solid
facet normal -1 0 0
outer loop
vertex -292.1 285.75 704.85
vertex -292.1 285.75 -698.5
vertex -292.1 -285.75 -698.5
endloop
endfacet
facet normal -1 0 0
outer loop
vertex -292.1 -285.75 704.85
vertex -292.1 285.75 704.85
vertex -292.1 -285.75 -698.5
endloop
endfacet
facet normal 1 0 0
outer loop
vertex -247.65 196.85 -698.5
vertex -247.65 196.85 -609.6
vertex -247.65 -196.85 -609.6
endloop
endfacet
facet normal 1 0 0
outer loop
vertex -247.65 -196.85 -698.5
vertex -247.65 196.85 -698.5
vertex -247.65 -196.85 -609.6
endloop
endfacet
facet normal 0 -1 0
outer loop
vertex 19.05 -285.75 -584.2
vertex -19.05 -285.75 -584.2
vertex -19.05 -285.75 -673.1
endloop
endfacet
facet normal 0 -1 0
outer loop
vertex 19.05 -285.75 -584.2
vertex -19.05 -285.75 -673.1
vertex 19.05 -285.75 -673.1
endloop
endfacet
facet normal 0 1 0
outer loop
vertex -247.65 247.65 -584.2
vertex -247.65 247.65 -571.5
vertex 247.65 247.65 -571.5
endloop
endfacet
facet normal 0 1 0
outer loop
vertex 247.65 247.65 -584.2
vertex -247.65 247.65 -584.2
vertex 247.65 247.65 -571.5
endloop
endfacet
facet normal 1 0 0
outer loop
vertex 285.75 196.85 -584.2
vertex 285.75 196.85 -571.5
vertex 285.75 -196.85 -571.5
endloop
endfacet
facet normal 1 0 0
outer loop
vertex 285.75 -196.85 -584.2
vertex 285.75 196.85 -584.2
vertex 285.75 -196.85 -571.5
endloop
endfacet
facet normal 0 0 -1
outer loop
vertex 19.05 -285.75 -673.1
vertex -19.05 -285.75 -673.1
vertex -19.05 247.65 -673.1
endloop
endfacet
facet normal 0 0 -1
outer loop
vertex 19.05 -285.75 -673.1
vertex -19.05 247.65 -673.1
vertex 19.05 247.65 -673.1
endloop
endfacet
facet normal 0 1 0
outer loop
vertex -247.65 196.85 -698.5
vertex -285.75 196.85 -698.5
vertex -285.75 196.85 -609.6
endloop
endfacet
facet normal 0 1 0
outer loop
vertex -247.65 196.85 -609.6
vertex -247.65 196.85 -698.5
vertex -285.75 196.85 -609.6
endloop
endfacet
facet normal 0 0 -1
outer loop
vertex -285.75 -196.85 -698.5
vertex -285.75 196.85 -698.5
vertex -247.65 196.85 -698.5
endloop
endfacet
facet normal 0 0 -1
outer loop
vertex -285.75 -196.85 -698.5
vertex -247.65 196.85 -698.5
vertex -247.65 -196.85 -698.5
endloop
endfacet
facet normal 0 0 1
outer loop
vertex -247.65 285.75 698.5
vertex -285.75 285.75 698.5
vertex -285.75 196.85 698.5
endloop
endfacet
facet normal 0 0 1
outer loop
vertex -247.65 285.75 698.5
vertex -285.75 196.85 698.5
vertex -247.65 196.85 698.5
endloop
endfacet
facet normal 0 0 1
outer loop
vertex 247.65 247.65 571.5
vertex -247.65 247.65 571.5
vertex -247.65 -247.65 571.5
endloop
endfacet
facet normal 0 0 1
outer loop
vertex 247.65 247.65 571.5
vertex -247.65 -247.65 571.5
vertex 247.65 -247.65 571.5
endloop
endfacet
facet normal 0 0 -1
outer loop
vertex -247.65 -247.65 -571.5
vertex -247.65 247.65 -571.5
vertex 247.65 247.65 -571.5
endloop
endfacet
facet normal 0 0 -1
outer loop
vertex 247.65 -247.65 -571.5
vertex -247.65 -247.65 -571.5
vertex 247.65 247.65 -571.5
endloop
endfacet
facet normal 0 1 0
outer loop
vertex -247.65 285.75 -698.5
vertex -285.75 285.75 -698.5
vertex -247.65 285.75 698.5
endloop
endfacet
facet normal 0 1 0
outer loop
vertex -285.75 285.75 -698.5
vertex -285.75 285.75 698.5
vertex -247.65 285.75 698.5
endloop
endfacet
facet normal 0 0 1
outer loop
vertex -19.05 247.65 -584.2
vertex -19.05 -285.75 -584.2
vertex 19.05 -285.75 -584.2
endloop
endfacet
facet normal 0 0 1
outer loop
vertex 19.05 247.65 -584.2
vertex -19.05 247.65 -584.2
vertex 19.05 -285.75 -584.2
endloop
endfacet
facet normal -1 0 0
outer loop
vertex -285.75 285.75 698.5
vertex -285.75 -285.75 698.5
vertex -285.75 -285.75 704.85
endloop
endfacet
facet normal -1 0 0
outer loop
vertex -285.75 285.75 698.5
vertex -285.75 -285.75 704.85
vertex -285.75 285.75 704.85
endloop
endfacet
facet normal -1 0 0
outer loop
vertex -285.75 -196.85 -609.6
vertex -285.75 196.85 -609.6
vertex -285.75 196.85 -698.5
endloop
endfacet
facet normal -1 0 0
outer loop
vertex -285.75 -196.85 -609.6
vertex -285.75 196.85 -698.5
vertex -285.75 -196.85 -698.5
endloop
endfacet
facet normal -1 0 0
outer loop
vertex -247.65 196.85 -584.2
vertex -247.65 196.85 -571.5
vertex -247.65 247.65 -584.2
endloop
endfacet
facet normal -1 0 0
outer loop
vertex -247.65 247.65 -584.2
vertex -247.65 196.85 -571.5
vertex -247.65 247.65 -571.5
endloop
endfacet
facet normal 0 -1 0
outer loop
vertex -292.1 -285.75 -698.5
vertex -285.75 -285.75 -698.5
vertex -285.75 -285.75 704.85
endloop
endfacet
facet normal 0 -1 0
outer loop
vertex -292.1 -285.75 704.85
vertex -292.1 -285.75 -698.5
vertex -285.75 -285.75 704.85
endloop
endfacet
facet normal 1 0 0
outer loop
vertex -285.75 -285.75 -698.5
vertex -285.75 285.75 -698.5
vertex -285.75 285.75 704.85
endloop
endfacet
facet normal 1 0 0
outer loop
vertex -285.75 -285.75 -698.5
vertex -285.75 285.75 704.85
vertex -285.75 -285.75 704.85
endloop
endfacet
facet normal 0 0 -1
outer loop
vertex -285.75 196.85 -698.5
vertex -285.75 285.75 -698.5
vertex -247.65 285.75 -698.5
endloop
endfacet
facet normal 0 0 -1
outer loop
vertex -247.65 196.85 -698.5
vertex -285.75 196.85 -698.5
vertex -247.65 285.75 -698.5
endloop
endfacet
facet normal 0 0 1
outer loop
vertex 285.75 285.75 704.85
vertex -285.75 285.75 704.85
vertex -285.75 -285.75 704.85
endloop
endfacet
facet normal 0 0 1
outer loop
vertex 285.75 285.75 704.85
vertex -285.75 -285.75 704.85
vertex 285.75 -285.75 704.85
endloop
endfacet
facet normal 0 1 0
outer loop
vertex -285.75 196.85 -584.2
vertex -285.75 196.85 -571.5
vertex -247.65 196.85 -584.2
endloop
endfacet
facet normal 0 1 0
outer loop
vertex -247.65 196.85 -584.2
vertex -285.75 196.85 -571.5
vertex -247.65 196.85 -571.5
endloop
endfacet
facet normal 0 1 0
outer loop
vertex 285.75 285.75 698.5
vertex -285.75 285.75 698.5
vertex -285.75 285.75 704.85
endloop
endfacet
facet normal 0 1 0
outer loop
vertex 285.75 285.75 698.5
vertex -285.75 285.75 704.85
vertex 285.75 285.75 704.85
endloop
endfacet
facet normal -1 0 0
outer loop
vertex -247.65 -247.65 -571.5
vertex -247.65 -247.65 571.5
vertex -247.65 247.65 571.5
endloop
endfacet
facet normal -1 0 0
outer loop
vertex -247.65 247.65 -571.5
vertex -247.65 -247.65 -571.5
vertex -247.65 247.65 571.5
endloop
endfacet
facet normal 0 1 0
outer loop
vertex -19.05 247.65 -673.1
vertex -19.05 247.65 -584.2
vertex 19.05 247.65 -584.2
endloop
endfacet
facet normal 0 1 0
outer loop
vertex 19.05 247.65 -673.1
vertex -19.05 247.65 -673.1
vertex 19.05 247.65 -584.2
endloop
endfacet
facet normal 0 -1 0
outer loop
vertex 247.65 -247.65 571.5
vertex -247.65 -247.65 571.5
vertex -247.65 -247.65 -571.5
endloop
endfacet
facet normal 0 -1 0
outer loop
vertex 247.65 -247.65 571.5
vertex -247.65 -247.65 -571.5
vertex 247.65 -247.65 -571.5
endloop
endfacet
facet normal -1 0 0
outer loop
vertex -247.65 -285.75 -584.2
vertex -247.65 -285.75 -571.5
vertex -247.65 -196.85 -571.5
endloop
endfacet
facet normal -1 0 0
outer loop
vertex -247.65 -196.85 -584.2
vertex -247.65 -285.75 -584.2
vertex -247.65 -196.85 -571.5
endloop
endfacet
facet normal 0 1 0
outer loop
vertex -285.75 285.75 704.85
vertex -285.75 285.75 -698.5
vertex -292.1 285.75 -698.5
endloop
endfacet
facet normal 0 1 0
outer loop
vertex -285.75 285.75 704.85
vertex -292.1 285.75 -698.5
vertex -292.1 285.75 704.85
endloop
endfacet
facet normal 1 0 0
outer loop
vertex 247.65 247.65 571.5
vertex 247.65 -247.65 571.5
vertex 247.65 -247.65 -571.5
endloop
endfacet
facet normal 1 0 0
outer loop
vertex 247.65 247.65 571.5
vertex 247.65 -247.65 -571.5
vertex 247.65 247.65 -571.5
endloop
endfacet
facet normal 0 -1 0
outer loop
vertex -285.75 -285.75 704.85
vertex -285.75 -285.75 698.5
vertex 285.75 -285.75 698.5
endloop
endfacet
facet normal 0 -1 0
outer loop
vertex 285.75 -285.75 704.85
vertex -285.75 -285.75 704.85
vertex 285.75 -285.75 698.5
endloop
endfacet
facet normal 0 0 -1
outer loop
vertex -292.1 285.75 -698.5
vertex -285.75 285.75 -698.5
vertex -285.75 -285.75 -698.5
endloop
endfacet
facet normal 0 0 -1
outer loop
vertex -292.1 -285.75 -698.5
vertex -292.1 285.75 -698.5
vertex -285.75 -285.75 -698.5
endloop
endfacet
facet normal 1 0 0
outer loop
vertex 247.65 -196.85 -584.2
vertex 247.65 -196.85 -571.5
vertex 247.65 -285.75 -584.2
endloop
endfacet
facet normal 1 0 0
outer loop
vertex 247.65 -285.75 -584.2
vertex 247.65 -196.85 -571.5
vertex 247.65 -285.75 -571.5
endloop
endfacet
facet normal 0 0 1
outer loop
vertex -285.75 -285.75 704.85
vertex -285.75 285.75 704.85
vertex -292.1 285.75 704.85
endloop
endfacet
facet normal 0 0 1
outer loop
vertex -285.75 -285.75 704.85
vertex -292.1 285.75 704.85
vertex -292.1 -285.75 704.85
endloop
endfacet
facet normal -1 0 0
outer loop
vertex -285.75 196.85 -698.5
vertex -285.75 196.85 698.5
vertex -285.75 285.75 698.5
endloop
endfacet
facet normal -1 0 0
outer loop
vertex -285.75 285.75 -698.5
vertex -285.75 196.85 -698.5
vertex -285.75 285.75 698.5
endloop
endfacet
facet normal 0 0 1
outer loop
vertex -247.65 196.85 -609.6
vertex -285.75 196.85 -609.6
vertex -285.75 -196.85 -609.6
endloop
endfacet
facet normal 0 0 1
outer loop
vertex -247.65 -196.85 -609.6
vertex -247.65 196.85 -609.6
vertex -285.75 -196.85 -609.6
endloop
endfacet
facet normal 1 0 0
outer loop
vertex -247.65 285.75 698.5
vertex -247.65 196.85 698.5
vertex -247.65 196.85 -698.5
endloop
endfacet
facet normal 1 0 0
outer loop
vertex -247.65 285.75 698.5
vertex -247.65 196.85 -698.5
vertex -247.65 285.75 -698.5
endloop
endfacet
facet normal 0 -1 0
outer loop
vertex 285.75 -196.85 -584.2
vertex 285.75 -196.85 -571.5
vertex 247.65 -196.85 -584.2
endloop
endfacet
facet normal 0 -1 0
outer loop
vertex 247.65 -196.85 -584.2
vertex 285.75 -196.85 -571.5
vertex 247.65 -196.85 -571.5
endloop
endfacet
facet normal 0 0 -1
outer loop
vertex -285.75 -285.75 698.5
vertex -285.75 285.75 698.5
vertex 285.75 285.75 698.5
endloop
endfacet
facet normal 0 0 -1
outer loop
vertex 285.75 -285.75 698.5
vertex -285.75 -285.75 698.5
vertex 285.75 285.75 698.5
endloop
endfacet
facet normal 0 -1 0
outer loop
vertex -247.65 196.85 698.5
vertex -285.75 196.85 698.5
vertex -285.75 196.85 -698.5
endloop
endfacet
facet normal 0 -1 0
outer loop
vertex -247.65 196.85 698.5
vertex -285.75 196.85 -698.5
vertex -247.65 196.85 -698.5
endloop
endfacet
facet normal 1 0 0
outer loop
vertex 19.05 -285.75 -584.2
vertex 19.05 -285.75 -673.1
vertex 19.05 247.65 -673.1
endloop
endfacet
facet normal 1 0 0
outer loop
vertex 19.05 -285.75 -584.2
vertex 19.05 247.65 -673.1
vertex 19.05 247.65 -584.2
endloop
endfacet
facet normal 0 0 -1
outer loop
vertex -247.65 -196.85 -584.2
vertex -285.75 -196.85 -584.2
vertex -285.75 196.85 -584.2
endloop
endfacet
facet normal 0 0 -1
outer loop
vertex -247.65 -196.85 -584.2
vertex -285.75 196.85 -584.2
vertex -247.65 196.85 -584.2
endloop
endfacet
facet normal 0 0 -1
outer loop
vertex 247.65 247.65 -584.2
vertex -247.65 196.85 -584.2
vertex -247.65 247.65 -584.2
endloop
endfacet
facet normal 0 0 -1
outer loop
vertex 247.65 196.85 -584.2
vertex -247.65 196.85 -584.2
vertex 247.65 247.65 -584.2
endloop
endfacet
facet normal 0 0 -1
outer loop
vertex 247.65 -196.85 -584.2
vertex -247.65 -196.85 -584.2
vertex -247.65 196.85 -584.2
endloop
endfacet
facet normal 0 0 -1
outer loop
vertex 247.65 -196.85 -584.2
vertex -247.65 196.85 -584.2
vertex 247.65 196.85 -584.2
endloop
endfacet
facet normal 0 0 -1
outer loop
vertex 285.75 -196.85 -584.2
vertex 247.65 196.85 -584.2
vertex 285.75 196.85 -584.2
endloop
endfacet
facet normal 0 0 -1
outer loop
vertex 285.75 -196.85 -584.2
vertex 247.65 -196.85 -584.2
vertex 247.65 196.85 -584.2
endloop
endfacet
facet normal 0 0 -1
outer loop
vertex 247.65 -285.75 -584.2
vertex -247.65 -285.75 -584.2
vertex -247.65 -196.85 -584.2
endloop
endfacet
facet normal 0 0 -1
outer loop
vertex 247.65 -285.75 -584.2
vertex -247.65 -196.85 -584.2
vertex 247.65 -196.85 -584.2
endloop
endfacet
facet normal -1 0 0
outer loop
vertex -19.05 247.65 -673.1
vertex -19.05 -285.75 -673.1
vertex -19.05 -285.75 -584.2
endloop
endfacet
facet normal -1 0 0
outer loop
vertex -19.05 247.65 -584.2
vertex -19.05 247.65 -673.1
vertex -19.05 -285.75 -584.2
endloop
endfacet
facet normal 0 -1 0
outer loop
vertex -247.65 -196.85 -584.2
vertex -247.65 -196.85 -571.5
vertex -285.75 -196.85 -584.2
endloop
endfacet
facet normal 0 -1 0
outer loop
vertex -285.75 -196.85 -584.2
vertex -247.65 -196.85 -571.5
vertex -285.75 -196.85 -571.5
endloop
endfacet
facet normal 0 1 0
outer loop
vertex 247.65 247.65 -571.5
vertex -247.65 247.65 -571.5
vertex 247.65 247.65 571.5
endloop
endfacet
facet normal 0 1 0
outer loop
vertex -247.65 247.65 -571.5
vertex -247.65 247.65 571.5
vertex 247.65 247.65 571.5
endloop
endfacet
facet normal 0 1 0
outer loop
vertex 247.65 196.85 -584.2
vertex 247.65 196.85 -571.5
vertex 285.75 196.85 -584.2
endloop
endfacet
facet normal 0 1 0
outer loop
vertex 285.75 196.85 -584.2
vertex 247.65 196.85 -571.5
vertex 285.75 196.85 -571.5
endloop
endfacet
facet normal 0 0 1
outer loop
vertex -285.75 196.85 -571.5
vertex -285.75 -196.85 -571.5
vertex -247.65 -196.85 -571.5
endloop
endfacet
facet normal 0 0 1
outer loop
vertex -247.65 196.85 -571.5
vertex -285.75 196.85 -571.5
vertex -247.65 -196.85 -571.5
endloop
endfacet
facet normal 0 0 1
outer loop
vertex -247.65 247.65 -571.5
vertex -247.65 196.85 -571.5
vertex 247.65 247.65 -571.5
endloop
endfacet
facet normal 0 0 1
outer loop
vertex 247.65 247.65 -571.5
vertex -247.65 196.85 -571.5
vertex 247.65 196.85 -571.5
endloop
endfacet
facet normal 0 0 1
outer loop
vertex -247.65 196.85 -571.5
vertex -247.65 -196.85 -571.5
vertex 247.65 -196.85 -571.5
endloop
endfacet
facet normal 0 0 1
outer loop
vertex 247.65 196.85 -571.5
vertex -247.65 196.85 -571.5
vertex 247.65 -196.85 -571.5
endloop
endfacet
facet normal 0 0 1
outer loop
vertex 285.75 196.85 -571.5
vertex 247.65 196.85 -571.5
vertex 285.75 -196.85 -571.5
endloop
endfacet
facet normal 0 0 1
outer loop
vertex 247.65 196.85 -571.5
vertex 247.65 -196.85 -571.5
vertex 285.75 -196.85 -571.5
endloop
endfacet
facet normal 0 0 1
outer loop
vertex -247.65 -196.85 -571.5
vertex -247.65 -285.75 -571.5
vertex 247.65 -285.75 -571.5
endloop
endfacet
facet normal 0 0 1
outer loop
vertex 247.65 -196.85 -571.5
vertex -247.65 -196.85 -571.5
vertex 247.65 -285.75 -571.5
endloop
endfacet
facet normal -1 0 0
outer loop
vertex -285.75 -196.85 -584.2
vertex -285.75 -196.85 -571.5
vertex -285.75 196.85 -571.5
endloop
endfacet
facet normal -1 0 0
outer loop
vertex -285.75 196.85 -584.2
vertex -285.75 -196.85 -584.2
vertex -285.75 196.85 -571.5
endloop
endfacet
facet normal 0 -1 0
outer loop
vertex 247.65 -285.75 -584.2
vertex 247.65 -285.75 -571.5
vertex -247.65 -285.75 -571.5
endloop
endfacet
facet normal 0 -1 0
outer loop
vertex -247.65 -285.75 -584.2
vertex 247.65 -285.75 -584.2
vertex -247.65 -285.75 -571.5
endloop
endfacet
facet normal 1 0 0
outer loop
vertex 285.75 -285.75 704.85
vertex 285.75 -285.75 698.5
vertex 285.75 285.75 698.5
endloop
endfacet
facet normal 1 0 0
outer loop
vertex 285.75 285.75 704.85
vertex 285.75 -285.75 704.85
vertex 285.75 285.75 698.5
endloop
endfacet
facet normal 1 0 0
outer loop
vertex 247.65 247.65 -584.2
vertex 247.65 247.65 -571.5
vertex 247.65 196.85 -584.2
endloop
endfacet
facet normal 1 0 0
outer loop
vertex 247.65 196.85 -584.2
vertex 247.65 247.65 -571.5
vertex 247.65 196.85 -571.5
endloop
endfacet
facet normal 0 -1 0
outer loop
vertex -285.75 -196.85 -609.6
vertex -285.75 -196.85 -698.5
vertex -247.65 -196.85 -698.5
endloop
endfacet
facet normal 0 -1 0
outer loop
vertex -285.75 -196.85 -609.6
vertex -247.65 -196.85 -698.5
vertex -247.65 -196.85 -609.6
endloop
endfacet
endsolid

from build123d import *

# Parameters (mm, degrees)
F0_W      = 495.3
F0_H      = 495.3
F1_DEPTH  = 571.5
F2_W      = 38.1
F2_H      = 88.9
F3_DEPTH  = 698.5
F5_DEPTH  = 12.7
F6_W      = 393.7
F6_H      = 88.9
F7_DEPTH  = 38.1
F8_W      = 38.1
F8_H      = 88.9
F9_DEPTH  = 533.4
F10_W     = 571.5
F10_H     = 571.5
F11_DEPTH = 6.35
F12_W     = 571.5
F12_H     = 1403.35
F13_DEPTH = 6.35


with BuildPart() as f1:
    # F0 (on Top) → F1 (new body, symmetric)
    with BuildSketch(Plane.XY):
        Rectangle(F0_W, F0_H)
    extrude(amount=F1_DEPTH, both=True)


with BuildPart() as f3:
    # F2 (on Top) → F3 (new body, symmetric)
    with BuildSketch(Plane.XY):
        with Locations((-266.7, 241.3)):
            Rectangle(F2_W, F2_H)
    extrude(amount=F3_DEPTH, both=True)


with BuildPart() as f5:
    # F4 (on face) → F5 (new body)
    with BuildSketch(Plane(origin=(0, 0, -571.5), x_dir=(1, 0, 0), z_dir=(0, 0, -1))):
        Polygon((247.65, 285.75), (-247.65, 285.75), (-247.65, 196.85), (-285.75, 196.85), (-285.75, -196.85), (-247.65, -196.85), (-247.65, -247.65), (247.65, -247.65), (247.65, -196.85), (285.75, -196.85), (285.75, 196.85), (247.65, 196.85), align=None)
    extrude(amount=F5_DEPTH)


with BuildPart() as f7:
    # F6 (on face) → F7 (new body, through all)
    with BuildSketch(Plane(origin=(-285.75, 0, 0), x_dir=(0, -1, 0), z_dir=(-1, 0, 0))):
        with Locations((0, -654.05)):
            Rectangle(F6_W, F6_H)
    extrude(amount=-F7_DEPTH)


with BuildPart() as f9:
    # F8 (on face) → F9 (new body, through all)
    with BuildSketch(Plane.XZ.offset(285.75)):
        with Locations((0, -628.65)):
            Rectangle(F8_W, F8_H)
    extrude(amount=-F9_DEPTH)


with BuildPart() as f11:
    # F10 (on face) → F11 (new body)
    with BuildSketch(Plane.XY.offset(698.5)):
        Rectangle(F10_W, F10_H)
    extrude(amount=F11_DEPTH)


with BuildPart() as f13:
    # F12 (on face) → F13 (new body)
    with BuildSketch(Plane(origin=(-285.75, 0, 0), x_dir=(0, -1, 0), z_dir=(-1, 0, 0))):
        with Locations((0, 3.175)):
            Rectangle(F12_W, F12_H)
    extrude(amount=F13_DEPTH)


solid = Compound([f1.part, f3.part, f5.part, f7.part, f9.part, f11.part, f13.part])
